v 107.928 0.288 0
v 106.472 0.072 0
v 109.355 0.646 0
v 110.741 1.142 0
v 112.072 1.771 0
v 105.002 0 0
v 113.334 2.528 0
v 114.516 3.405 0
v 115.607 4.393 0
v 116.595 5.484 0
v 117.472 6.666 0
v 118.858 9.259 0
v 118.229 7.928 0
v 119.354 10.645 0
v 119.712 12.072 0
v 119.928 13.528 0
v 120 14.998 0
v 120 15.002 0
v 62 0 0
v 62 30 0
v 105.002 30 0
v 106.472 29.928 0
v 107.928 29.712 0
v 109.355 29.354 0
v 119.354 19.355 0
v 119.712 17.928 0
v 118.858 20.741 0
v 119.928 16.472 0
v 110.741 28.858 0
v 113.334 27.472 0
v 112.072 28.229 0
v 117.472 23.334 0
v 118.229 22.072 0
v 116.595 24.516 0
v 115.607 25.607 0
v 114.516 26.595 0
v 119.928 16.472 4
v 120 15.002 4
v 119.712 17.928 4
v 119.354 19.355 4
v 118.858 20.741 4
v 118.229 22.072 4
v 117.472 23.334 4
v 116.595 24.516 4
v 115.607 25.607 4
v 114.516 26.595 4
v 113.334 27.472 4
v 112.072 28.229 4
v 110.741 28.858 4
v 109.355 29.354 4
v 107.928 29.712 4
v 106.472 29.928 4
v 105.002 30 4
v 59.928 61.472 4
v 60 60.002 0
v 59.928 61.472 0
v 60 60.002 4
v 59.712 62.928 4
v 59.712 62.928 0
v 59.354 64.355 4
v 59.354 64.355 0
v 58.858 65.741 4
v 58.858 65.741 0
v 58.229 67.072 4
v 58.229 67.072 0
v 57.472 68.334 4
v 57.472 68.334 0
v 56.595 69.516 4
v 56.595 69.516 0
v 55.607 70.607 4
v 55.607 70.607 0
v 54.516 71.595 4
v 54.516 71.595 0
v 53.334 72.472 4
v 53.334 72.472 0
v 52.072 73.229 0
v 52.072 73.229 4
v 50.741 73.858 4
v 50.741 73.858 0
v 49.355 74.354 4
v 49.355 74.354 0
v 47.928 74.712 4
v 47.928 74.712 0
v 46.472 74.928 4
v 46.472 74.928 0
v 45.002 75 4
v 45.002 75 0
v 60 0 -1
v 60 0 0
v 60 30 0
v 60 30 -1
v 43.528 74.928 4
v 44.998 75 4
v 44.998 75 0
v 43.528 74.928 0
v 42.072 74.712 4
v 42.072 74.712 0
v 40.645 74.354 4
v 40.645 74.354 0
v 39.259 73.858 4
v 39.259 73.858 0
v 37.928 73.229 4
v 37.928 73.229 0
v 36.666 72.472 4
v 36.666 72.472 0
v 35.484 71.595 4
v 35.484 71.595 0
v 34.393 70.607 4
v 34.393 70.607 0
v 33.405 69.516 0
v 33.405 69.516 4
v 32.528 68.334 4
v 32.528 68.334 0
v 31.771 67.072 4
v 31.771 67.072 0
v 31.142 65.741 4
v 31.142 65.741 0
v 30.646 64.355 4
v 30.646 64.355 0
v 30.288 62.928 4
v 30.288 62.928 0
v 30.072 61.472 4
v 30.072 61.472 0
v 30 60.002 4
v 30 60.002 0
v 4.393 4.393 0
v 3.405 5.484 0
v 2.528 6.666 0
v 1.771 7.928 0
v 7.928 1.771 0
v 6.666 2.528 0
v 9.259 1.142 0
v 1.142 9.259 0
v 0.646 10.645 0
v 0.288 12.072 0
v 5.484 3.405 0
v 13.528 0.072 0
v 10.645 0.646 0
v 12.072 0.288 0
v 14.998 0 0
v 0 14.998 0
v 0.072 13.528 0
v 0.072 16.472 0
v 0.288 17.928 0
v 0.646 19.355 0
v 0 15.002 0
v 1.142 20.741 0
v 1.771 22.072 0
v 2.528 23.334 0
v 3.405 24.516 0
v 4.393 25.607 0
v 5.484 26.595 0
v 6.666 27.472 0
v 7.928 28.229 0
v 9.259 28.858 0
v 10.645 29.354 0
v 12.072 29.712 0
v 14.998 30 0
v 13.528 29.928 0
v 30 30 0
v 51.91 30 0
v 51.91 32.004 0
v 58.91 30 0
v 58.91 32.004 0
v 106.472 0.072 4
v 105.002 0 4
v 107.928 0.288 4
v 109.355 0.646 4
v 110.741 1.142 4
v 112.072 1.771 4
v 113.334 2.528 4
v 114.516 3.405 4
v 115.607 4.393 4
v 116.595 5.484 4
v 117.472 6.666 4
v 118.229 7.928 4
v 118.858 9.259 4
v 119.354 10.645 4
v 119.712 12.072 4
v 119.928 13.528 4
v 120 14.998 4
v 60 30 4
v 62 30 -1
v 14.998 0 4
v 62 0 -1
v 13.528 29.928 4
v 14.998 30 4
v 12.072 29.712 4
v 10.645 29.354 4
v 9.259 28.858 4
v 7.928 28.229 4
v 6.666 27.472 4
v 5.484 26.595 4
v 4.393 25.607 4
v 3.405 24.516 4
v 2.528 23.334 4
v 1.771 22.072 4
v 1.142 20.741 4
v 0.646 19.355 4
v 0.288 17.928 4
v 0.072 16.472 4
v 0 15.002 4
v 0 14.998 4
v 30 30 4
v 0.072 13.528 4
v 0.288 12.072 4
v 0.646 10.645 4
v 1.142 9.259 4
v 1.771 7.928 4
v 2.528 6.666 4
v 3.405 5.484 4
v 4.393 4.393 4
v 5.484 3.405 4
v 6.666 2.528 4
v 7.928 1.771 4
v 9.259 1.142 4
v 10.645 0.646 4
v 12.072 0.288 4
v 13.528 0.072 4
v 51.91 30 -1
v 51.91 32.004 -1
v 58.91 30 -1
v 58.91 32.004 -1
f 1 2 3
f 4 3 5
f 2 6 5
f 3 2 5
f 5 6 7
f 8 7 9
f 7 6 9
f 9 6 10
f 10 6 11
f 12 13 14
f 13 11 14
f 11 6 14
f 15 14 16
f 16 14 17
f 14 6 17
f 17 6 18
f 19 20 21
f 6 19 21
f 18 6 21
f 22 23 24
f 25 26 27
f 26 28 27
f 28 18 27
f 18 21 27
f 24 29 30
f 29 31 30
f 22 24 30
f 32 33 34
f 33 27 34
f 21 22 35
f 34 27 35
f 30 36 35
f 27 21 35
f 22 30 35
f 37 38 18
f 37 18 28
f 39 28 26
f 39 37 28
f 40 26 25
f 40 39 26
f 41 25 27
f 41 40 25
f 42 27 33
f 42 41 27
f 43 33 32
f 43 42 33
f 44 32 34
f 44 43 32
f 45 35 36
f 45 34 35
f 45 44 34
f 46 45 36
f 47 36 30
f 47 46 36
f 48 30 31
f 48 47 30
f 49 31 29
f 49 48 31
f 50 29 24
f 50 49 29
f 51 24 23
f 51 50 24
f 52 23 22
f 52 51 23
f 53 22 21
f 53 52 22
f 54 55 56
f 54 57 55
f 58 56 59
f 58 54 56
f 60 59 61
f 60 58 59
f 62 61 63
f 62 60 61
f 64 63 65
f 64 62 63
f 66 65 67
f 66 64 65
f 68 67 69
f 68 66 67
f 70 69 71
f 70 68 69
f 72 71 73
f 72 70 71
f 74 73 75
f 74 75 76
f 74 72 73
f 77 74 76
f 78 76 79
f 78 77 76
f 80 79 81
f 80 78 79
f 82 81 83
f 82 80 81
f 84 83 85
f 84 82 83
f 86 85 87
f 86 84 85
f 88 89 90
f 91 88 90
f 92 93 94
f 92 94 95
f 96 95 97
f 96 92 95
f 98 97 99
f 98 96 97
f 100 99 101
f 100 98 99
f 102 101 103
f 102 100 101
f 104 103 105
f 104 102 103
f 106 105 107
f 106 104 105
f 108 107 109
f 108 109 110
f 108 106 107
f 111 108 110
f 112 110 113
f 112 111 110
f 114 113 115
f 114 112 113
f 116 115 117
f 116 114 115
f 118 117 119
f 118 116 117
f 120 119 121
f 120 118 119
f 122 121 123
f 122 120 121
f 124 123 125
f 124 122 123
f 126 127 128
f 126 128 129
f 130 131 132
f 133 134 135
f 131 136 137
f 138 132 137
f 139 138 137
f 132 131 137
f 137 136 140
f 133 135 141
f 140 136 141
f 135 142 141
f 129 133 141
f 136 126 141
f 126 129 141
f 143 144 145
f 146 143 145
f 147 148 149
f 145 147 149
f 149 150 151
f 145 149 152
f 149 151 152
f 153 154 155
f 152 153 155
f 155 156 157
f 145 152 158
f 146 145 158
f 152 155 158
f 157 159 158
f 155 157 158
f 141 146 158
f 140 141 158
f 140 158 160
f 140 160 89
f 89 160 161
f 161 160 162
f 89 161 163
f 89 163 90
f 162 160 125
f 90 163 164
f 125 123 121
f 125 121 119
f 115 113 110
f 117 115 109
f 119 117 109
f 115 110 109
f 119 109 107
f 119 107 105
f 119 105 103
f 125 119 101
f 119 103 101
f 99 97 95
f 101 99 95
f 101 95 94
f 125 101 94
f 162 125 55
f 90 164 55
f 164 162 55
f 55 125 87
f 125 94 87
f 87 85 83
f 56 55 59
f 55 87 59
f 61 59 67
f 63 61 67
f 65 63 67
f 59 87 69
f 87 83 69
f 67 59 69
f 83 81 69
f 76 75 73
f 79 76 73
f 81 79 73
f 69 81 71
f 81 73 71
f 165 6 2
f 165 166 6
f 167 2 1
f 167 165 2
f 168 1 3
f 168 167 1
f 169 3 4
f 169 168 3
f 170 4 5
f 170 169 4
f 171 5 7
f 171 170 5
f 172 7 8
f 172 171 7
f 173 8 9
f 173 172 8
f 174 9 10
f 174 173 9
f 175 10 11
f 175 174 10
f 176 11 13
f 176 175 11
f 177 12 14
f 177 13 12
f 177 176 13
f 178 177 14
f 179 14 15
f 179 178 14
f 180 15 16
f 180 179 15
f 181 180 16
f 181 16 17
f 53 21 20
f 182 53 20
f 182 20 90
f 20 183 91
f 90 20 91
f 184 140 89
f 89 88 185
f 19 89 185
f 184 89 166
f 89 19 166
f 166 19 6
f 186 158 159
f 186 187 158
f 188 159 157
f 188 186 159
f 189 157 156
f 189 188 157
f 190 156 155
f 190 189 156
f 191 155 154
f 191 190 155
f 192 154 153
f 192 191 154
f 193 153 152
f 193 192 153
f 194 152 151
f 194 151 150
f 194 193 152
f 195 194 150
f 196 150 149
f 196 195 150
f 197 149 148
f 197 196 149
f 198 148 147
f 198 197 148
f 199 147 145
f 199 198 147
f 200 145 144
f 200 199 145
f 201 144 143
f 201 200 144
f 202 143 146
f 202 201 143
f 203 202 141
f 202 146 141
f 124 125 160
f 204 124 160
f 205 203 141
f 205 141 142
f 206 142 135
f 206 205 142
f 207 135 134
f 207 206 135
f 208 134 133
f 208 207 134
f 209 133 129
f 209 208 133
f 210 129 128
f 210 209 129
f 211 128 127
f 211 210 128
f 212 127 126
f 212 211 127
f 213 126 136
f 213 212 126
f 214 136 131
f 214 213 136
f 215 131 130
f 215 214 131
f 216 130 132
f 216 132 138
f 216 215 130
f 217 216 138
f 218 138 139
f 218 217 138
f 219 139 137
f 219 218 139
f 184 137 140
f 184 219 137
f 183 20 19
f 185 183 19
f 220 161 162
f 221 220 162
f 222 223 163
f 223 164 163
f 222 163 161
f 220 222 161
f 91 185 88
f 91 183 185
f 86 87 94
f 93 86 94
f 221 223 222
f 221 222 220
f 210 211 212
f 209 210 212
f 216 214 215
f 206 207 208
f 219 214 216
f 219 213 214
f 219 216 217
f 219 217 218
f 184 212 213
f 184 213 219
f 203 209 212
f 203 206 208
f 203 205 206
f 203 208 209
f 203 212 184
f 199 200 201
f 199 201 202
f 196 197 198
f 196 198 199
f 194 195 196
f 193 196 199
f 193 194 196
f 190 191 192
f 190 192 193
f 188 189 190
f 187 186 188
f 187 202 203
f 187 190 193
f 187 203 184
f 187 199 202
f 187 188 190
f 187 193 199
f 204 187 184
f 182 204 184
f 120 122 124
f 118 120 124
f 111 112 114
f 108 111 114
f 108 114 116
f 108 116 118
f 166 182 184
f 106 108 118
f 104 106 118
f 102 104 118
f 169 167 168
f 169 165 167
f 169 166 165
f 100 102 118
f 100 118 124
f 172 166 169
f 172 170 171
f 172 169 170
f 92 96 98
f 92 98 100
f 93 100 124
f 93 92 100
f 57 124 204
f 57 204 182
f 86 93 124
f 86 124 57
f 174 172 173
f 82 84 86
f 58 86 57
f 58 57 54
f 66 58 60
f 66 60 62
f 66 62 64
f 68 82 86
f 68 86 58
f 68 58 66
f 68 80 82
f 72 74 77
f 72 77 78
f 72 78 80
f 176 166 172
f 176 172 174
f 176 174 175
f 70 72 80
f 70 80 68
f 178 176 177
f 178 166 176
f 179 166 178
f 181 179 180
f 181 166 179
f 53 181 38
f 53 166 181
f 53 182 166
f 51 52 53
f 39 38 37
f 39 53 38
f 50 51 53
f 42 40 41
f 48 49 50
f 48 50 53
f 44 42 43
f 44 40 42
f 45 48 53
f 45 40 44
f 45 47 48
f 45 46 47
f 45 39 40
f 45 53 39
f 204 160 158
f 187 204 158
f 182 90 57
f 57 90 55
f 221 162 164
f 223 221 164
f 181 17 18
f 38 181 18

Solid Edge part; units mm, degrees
sketch "Sketch1" plane through (0, 0, 0) normal (0, 0, 1) x (1, 0, 0)
  line L0 (30, 75) -> (30, 30)
  line L1 (30, 30) -> (60, 30)
  line L2 (60, 30) -> (60, 75)
  line L3 (60, 75) -> (30, 75)
  line L4 (120, 30) -> (0, 30)
  line L5 (0, 30) -> (0, 0)
  line L6 (0, 0) -> (120, 0)
  line L7 (120, 0) -> (120, 30)
  dimension "D1" = 30
  dimension "D2" = 30
  dimension "D3" = 30
  dimension "D4" = 120
extrude "Protrusion1" add sketch "Sketch1" along normal blind 4
fillet "RoundMain" radius 15 6 edges at (0, 30, 2) (30, 75, 2) (60, 75, 2) (120, 30, 2) (120, 0, 2) (0, 0, 2)
sketch "Sketch2" plane through (60, 37.5, 0) normal (0, 0, -1) x (-1, 0, 0)
  line L0 (0, -7.5) -> (-2, -7.5)
  line L1 (-2, -7.5) -> (-2, -37.5)
  line L2 (-2, -37.5) -> (0, -37.5)
  line L3 (0, -37.5) -> (0, -7.5)
extrude "ExtrudedProtrusion_3" add sketch "Sketch2" along normal blind 1
sketch "Sketch3" plane through (30, 37.5, 0) normal (0, 0, -1) x (-1, 0, 0)
  line L0 (-28.9101, -7.5) -> (-21.9101, -7.5)
  line L1 (-21.9101, -7.5) -> (-21.9101, -5.4965)
  line L2 (-21.9101, -5.4965) -> (-28.9101, -5.4965)
  line L3 (-28.9101, -5.4965) -> (-28.9101, -7.5)
extrude "ExtrudedProtrusion_6" add sketch "Sketch3" along normal blind 1
